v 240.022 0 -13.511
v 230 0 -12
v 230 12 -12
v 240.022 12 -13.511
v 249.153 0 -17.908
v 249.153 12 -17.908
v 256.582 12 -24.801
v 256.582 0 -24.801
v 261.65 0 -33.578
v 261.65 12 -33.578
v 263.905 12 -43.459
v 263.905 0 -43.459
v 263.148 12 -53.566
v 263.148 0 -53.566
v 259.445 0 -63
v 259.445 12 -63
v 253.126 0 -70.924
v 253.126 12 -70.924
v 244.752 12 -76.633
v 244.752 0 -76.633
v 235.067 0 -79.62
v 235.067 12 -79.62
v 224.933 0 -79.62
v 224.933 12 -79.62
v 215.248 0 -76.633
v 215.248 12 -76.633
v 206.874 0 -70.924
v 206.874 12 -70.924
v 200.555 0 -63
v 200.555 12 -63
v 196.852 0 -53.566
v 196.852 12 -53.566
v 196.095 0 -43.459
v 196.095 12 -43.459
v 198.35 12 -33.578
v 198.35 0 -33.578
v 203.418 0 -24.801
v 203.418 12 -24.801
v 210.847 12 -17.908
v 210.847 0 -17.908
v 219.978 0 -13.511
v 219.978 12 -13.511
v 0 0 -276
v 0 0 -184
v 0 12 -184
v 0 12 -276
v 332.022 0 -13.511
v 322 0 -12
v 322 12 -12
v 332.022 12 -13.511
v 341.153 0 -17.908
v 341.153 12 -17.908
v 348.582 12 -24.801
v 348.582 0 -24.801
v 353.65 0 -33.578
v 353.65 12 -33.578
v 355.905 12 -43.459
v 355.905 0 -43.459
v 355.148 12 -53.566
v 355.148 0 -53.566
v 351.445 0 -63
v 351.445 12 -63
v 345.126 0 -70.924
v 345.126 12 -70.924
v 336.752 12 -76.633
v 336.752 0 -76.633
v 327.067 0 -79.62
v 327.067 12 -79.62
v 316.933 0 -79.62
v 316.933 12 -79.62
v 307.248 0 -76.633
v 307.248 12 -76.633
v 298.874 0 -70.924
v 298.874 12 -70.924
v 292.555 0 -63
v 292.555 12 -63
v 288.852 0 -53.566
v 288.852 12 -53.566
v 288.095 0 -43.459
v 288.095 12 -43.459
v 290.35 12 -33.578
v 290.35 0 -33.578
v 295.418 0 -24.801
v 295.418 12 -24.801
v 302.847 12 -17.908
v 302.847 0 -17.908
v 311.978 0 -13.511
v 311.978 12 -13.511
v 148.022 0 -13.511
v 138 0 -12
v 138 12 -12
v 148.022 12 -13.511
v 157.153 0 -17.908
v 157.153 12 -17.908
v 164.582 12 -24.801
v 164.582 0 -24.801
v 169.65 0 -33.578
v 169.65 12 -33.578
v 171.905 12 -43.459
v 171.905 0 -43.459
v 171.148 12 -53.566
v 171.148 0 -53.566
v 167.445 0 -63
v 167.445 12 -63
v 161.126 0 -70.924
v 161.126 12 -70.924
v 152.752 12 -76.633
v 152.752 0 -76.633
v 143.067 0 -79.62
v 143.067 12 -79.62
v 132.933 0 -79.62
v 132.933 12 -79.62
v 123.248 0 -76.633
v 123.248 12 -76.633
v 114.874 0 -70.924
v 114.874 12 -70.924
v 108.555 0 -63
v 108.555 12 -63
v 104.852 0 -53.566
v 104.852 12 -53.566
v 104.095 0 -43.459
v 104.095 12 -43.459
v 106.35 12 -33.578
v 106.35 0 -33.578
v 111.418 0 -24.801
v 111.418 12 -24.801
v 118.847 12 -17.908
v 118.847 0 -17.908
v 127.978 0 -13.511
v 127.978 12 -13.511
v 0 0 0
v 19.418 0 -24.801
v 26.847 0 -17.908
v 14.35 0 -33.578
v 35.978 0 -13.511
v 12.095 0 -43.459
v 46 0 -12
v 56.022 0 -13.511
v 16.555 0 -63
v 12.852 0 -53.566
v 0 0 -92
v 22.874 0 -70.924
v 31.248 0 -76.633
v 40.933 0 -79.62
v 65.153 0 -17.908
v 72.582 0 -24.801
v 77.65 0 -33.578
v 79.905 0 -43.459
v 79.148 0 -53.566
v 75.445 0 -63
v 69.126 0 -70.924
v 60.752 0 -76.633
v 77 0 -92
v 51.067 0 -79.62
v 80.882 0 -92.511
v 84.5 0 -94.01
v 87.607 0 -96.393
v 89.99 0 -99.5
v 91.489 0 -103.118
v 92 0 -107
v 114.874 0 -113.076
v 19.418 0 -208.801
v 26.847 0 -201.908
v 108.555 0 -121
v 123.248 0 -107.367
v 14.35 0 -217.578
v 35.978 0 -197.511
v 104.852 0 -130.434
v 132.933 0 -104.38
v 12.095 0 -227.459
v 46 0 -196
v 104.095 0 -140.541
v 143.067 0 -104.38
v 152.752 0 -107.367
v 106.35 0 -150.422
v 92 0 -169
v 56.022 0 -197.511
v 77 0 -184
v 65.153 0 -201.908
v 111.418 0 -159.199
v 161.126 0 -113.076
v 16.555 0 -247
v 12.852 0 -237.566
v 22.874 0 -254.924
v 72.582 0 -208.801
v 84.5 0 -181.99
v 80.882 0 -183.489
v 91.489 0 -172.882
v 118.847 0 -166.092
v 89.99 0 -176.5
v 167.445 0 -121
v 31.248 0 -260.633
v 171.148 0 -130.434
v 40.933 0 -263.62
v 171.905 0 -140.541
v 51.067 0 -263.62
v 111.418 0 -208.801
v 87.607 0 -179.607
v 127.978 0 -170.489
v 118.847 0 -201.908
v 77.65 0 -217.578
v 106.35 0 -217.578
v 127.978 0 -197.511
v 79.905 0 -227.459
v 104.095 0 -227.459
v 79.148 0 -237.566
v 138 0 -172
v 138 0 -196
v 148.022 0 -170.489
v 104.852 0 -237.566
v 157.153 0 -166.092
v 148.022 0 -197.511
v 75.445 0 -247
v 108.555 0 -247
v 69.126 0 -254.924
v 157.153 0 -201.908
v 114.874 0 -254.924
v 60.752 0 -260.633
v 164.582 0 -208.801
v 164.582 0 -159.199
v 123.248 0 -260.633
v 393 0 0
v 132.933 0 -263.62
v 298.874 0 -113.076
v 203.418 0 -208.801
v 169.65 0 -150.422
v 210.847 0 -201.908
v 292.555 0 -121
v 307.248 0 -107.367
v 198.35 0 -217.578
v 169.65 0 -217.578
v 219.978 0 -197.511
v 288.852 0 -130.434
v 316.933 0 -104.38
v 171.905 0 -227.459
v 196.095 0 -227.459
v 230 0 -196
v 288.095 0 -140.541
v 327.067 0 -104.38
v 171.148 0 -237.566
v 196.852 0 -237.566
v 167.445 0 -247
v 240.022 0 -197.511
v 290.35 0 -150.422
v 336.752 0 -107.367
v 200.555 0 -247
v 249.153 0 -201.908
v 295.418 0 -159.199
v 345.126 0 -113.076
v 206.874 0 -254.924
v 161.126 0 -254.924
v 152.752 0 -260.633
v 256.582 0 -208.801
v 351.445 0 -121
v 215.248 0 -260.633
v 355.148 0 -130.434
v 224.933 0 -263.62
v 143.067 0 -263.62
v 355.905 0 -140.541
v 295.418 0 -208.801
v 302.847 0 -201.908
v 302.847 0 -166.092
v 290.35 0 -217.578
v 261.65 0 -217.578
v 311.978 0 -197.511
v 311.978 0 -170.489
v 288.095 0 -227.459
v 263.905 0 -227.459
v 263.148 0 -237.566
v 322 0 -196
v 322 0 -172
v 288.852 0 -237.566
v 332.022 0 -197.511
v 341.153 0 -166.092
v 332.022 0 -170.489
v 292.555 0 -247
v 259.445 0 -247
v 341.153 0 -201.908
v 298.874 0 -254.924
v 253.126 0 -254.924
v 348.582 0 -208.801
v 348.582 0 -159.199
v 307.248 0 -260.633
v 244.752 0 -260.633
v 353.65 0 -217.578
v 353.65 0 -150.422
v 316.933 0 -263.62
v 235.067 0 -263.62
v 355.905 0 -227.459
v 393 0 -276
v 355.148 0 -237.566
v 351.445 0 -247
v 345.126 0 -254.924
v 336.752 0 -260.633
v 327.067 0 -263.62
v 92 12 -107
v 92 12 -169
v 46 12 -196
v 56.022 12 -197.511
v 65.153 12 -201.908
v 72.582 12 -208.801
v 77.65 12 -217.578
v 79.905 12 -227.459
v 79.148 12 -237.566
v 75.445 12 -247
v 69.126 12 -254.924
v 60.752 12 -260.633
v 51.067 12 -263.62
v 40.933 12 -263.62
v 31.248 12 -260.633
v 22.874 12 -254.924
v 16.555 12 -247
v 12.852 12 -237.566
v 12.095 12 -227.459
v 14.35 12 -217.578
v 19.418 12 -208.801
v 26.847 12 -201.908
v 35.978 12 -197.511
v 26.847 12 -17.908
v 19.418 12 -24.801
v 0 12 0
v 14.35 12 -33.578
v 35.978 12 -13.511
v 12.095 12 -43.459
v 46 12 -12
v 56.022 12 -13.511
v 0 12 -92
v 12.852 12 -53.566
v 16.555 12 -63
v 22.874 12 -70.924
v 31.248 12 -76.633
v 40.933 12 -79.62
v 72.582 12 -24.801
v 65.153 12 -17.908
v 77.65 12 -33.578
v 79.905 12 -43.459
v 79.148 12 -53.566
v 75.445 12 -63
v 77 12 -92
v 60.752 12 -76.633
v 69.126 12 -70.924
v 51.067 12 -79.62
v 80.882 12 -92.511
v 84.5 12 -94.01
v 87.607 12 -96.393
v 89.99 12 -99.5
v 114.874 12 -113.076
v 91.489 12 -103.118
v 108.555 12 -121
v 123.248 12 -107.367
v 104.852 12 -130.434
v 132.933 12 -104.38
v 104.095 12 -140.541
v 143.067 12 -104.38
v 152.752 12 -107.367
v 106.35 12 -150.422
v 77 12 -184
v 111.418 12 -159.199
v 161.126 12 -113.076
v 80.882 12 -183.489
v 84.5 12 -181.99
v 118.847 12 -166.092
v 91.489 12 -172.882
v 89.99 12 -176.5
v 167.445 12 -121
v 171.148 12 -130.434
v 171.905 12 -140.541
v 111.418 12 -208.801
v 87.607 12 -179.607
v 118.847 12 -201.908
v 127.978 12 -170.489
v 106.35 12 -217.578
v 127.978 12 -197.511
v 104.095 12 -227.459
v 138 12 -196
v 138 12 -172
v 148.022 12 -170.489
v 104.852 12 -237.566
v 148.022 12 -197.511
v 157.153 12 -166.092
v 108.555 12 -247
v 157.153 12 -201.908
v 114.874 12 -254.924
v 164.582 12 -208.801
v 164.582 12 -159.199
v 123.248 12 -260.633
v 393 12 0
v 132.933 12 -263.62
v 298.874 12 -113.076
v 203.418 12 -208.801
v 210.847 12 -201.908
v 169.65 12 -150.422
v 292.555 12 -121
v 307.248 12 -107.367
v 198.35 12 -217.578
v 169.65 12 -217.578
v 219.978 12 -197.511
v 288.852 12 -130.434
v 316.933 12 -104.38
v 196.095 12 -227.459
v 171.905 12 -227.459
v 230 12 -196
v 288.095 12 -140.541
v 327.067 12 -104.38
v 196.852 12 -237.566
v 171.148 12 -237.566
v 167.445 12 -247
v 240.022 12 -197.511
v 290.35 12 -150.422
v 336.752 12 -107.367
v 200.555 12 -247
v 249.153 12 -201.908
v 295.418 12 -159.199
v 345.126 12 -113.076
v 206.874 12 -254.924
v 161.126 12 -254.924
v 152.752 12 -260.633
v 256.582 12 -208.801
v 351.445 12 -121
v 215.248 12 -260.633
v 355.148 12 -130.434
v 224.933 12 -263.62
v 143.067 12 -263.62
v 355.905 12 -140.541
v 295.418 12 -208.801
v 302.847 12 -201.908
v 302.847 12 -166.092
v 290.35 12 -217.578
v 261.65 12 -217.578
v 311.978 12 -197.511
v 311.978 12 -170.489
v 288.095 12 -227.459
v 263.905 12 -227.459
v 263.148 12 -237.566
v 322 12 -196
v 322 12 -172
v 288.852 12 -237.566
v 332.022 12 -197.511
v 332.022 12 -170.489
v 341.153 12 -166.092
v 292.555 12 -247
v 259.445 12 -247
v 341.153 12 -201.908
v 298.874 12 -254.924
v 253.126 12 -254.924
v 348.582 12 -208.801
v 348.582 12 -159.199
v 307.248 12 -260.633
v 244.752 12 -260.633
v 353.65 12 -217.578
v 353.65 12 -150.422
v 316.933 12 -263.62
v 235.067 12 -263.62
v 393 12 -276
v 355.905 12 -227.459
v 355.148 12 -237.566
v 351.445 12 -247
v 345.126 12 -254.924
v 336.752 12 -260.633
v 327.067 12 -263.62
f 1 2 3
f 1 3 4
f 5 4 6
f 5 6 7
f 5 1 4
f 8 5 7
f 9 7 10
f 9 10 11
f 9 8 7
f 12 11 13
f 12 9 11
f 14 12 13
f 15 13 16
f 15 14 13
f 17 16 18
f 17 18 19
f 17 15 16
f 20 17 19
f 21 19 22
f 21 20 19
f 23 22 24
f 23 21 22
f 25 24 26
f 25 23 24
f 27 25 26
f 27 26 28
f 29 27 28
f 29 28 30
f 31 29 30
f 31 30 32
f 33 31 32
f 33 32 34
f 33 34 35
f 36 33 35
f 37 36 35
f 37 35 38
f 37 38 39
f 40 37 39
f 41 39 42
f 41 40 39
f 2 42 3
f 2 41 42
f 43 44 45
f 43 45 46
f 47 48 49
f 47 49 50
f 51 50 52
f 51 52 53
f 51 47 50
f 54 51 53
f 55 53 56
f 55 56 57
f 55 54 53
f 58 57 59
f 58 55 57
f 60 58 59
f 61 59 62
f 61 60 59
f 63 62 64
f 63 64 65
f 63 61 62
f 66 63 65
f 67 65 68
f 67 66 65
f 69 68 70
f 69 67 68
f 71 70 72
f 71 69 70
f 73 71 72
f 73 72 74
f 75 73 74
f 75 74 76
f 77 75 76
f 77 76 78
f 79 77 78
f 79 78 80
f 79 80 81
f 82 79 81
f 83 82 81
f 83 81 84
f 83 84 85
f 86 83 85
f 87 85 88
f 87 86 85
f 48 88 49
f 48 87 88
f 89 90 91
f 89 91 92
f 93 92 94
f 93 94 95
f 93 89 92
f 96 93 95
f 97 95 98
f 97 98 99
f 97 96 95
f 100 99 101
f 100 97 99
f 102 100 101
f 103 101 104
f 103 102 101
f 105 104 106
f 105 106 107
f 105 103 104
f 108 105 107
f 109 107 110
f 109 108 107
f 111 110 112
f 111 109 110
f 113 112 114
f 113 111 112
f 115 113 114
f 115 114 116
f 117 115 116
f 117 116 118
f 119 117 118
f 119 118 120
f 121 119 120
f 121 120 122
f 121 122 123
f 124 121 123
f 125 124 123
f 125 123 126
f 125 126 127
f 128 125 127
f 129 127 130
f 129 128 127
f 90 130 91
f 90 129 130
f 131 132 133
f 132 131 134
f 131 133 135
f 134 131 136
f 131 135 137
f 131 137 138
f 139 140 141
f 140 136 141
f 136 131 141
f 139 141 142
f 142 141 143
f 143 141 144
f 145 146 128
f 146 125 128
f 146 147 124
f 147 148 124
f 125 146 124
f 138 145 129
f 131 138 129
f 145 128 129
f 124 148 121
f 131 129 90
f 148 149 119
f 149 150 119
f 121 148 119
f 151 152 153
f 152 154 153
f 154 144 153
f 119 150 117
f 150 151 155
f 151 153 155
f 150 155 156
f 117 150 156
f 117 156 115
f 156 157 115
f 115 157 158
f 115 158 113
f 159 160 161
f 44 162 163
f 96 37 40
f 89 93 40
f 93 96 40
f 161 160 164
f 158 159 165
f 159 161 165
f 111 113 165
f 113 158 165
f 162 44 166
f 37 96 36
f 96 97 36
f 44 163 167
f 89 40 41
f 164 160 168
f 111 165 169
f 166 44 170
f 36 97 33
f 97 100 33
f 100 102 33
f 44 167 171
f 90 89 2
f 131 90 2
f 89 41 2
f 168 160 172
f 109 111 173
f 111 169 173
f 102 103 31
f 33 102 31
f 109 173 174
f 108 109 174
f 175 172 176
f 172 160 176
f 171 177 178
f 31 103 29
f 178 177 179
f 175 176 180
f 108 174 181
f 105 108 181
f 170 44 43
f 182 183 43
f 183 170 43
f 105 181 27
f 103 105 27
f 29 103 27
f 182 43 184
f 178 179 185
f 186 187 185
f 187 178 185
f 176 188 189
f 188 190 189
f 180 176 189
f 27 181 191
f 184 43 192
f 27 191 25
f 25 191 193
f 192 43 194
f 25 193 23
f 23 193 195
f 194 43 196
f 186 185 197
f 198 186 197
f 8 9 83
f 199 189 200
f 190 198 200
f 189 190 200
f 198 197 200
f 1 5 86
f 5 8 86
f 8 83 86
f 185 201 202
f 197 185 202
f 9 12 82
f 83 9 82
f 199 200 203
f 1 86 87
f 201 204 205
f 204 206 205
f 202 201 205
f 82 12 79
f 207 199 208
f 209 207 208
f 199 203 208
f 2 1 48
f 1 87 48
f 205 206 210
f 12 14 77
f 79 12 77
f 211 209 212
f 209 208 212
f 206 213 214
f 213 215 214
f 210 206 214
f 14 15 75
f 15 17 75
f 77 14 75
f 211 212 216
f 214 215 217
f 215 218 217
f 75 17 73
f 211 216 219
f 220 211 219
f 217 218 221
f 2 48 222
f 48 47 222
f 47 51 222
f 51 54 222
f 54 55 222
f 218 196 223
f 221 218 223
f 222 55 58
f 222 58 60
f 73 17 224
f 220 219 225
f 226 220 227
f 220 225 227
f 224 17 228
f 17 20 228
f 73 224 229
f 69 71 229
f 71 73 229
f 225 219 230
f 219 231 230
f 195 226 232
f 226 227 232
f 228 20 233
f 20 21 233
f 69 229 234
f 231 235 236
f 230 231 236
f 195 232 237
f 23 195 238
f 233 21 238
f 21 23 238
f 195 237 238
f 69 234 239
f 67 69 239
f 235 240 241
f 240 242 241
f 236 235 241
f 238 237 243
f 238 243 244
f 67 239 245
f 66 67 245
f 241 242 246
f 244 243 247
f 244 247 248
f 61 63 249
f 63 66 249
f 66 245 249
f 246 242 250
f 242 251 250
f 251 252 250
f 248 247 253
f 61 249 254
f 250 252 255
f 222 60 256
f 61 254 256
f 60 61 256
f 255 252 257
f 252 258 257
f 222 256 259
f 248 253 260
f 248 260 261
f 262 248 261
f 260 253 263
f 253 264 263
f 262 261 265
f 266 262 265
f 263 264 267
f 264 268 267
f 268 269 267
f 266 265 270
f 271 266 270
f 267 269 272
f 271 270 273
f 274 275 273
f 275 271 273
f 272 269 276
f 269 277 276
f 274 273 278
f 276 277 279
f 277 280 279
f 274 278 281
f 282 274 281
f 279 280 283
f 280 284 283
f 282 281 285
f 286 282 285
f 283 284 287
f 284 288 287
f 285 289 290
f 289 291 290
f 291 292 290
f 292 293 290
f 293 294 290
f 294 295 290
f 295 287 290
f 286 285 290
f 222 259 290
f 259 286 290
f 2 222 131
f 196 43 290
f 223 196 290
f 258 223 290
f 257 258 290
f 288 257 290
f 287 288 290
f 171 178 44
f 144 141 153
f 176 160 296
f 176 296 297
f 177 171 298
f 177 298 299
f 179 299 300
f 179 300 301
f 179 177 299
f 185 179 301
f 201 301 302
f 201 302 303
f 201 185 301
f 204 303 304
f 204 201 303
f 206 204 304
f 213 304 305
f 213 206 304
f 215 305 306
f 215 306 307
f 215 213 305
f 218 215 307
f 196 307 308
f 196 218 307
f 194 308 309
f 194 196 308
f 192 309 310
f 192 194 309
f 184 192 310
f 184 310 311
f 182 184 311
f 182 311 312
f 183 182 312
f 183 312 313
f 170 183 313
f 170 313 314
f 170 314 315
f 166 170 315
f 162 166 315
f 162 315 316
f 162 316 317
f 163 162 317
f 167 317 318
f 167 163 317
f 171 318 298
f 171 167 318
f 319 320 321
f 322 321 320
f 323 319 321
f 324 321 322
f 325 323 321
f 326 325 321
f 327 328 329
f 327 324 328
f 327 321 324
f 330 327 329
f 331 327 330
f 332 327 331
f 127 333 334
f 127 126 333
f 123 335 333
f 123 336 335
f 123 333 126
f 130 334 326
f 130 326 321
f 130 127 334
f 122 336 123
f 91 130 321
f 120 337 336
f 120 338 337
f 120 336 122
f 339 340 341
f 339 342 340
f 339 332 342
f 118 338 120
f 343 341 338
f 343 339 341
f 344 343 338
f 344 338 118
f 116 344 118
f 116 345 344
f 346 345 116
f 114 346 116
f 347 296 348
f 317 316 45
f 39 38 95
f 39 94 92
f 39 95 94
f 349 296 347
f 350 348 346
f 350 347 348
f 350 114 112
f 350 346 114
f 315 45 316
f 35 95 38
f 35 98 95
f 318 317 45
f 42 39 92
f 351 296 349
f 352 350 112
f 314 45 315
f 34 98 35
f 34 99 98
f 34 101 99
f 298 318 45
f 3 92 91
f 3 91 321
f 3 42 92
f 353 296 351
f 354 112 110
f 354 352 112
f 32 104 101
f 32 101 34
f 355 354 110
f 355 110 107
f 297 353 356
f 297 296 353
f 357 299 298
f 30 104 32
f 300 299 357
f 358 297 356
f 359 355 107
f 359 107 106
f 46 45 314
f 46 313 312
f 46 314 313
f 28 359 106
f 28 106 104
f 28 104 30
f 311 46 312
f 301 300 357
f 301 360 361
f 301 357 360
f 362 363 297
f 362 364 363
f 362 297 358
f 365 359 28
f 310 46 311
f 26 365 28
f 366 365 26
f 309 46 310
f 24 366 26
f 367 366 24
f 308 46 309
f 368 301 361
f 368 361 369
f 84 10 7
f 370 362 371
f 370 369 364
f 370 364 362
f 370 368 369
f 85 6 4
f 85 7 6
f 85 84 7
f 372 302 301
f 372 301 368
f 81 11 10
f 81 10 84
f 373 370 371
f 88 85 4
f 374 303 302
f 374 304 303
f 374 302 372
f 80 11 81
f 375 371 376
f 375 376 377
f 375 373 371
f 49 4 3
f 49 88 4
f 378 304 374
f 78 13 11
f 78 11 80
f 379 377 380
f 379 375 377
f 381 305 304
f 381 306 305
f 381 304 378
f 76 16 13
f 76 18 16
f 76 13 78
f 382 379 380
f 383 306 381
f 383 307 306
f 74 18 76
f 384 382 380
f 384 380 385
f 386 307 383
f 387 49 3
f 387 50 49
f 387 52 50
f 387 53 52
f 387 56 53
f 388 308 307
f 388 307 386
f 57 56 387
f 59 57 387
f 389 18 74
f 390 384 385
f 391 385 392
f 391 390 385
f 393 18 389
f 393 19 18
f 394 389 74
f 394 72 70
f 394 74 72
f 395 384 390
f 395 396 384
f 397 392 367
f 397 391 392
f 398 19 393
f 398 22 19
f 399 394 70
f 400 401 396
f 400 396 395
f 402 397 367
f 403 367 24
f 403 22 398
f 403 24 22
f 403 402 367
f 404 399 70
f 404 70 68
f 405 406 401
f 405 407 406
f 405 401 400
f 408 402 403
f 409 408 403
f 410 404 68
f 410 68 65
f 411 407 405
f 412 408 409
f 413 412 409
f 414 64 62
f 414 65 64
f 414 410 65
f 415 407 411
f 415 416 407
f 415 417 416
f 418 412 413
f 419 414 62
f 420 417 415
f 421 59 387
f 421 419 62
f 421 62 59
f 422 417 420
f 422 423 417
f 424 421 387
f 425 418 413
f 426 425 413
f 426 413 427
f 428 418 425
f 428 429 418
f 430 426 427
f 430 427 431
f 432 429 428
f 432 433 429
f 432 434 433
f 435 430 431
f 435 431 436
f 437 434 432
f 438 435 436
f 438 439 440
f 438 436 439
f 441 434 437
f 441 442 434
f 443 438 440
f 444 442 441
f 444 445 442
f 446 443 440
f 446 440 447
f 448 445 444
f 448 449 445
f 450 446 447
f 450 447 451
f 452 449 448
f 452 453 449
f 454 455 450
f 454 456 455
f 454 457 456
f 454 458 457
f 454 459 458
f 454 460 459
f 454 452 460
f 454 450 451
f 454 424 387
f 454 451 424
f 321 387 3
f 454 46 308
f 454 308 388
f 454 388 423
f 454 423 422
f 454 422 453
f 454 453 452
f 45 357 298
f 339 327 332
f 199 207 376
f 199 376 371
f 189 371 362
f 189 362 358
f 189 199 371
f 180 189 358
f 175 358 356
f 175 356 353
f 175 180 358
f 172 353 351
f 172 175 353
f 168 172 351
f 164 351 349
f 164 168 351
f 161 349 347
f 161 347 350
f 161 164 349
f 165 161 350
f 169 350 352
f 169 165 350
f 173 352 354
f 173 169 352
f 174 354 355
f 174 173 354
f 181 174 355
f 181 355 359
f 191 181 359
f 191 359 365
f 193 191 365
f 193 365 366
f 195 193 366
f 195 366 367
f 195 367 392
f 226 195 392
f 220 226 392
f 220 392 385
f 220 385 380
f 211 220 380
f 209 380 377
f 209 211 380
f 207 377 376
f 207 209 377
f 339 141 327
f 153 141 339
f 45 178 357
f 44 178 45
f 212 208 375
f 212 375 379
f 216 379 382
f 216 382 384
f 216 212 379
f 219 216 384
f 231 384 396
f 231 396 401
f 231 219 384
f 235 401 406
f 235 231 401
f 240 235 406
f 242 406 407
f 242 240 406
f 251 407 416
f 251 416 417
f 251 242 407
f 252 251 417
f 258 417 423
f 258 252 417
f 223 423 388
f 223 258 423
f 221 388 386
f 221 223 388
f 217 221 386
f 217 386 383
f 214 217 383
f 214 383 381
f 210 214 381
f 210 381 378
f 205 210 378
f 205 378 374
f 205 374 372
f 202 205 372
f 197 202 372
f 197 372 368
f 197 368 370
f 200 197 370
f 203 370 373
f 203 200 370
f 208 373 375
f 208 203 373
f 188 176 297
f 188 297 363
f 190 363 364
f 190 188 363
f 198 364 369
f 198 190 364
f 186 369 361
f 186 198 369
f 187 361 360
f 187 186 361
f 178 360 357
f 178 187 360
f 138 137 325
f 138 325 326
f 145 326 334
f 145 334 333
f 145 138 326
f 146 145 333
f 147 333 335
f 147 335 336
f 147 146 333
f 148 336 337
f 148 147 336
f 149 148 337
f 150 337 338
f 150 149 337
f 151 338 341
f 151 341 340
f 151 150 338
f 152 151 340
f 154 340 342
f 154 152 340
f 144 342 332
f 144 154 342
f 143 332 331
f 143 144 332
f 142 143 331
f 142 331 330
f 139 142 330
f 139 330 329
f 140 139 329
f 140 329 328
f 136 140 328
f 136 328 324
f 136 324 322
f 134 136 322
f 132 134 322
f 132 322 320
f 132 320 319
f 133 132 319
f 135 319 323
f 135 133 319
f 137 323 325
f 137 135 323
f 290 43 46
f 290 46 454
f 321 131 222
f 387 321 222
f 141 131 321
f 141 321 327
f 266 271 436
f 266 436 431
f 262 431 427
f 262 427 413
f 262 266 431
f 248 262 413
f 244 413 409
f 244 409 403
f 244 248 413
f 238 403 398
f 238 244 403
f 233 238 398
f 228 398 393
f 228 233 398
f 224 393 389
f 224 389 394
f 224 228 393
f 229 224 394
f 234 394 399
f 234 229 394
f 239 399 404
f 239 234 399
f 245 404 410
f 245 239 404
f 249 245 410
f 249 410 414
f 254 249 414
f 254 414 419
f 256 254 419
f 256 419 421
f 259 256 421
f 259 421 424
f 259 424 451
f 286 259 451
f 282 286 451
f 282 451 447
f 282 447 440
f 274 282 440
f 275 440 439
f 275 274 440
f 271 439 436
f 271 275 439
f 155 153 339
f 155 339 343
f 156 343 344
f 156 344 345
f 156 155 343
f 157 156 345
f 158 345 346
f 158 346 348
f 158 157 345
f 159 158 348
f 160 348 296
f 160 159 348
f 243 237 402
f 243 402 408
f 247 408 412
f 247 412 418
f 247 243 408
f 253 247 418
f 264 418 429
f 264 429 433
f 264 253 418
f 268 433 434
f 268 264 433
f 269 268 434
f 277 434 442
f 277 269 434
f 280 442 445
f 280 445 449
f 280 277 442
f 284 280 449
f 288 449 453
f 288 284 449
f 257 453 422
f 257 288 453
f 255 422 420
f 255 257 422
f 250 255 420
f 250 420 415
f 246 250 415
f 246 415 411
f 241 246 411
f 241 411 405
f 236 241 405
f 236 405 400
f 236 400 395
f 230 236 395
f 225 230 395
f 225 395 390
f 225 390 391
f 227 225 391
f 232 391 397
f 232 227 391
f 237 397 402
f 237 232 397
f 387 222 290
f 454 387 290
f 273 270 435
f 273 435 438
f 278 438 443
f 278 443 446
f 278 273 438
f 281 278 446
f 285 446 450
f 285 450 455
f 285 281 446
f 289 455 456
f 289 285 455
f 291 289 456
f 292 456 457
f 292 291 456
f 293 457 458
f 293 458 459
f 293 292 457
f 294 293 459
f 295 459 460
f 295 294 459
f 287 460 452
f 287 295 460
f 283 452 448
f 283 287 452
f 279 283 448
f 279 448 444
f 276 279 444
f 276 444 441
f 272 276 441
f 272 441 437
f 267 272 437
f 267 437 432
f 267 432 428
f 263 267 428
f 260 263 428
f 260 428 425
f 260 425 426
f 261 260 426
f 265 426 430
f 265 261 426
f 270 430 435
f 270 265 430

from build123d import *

# Parameters (mm, degrees)
SKETCH1_W           = 393
SKETCH1_H           = 276
BOSS_EXTRUDE1_DEPTH = 12
SKETCH1_3_R         = 34
CUT_EXTRUDE1_DEPTH  = 12
LPATTERN1_COUNT     = 4
LPATTERN1_PITCH     = 92
SKETCH1_4_R         = 34
CUT_EXTRUDE3_DEPTH  = 12


with BuildPart() as part:
    # Sketch1 → Boss-Extrude1 (new body)
    with BuildSketch(Plane(origin=(0, 0, 0), x_dir=(1, 0, 0), z_dir=(0, 1, 0))):
        with Locations((196.5, 138)):
            Rectangle(SKETCH1_W, SKETCH1_H)
    extrude(amount=BOSS_EXTRUDE1_DEPTH)

    # Sketch1<3> → Cut-Extrude1 (cut)
    with BuildSketch(Plane(origin=(0, 0, 0), x_dir=(1, 0, 0), z_dir=(0, 1, 0))):
        with Locations(Location((46, 46, 0), (0, 0, 270))):
            Circle(SKETCH1_3_R)
        with Locations(Location((46, 230, 0), (0, 0, 270))):
            Circle(SKETCH1_3_R)
    cut_extrude1 = extrude(amount=CUT_EXTRUDE1_DEPTH, mode=Mode.SUBTRACT)

    # LPattern1: Cut-Extrude1 ×4
    with Locations(*[(i * LPATTERN1_PITCH, 0, 0) for i in range(1, LPATTERN1_COUNT)]):
        add(cut_extrude1, mode=Mode.SUBTRACT)

    # Sketch1<4> → Cut-Extrude3 (cut)
    with BuildSketch(Plane(origin=(0, 0, 0), x_dir=(1, 0, 0), z_dir=(0, 1, 0))):
        with BuildLine():
            Line((0, 184), (0, 92))
            Line((0, 92), (77, 92))
            ThreePointArc((77, 92), (87.606601718, 96.393398282), (92, 107))
            Line((92, 107), (92, 169))
            ThreePointArc((92, 169), (87.606601718, 179.606601718), (77, 184))
            Line((77, 184), (0, 184))
        make_face()
        with Locations(Location((138, 138, 0), (0, 0, 90))):
            Circle(SKETCH1_4_R)
        with Locations(Location((322, 138, 0), (0, 0, 90))):
            Circle(SKETCH1_4_R)
    extrude(amount=CUT_EXTRUDE3_DEPTH, mode=Mode.SUBTRACT)


solid = part.part
